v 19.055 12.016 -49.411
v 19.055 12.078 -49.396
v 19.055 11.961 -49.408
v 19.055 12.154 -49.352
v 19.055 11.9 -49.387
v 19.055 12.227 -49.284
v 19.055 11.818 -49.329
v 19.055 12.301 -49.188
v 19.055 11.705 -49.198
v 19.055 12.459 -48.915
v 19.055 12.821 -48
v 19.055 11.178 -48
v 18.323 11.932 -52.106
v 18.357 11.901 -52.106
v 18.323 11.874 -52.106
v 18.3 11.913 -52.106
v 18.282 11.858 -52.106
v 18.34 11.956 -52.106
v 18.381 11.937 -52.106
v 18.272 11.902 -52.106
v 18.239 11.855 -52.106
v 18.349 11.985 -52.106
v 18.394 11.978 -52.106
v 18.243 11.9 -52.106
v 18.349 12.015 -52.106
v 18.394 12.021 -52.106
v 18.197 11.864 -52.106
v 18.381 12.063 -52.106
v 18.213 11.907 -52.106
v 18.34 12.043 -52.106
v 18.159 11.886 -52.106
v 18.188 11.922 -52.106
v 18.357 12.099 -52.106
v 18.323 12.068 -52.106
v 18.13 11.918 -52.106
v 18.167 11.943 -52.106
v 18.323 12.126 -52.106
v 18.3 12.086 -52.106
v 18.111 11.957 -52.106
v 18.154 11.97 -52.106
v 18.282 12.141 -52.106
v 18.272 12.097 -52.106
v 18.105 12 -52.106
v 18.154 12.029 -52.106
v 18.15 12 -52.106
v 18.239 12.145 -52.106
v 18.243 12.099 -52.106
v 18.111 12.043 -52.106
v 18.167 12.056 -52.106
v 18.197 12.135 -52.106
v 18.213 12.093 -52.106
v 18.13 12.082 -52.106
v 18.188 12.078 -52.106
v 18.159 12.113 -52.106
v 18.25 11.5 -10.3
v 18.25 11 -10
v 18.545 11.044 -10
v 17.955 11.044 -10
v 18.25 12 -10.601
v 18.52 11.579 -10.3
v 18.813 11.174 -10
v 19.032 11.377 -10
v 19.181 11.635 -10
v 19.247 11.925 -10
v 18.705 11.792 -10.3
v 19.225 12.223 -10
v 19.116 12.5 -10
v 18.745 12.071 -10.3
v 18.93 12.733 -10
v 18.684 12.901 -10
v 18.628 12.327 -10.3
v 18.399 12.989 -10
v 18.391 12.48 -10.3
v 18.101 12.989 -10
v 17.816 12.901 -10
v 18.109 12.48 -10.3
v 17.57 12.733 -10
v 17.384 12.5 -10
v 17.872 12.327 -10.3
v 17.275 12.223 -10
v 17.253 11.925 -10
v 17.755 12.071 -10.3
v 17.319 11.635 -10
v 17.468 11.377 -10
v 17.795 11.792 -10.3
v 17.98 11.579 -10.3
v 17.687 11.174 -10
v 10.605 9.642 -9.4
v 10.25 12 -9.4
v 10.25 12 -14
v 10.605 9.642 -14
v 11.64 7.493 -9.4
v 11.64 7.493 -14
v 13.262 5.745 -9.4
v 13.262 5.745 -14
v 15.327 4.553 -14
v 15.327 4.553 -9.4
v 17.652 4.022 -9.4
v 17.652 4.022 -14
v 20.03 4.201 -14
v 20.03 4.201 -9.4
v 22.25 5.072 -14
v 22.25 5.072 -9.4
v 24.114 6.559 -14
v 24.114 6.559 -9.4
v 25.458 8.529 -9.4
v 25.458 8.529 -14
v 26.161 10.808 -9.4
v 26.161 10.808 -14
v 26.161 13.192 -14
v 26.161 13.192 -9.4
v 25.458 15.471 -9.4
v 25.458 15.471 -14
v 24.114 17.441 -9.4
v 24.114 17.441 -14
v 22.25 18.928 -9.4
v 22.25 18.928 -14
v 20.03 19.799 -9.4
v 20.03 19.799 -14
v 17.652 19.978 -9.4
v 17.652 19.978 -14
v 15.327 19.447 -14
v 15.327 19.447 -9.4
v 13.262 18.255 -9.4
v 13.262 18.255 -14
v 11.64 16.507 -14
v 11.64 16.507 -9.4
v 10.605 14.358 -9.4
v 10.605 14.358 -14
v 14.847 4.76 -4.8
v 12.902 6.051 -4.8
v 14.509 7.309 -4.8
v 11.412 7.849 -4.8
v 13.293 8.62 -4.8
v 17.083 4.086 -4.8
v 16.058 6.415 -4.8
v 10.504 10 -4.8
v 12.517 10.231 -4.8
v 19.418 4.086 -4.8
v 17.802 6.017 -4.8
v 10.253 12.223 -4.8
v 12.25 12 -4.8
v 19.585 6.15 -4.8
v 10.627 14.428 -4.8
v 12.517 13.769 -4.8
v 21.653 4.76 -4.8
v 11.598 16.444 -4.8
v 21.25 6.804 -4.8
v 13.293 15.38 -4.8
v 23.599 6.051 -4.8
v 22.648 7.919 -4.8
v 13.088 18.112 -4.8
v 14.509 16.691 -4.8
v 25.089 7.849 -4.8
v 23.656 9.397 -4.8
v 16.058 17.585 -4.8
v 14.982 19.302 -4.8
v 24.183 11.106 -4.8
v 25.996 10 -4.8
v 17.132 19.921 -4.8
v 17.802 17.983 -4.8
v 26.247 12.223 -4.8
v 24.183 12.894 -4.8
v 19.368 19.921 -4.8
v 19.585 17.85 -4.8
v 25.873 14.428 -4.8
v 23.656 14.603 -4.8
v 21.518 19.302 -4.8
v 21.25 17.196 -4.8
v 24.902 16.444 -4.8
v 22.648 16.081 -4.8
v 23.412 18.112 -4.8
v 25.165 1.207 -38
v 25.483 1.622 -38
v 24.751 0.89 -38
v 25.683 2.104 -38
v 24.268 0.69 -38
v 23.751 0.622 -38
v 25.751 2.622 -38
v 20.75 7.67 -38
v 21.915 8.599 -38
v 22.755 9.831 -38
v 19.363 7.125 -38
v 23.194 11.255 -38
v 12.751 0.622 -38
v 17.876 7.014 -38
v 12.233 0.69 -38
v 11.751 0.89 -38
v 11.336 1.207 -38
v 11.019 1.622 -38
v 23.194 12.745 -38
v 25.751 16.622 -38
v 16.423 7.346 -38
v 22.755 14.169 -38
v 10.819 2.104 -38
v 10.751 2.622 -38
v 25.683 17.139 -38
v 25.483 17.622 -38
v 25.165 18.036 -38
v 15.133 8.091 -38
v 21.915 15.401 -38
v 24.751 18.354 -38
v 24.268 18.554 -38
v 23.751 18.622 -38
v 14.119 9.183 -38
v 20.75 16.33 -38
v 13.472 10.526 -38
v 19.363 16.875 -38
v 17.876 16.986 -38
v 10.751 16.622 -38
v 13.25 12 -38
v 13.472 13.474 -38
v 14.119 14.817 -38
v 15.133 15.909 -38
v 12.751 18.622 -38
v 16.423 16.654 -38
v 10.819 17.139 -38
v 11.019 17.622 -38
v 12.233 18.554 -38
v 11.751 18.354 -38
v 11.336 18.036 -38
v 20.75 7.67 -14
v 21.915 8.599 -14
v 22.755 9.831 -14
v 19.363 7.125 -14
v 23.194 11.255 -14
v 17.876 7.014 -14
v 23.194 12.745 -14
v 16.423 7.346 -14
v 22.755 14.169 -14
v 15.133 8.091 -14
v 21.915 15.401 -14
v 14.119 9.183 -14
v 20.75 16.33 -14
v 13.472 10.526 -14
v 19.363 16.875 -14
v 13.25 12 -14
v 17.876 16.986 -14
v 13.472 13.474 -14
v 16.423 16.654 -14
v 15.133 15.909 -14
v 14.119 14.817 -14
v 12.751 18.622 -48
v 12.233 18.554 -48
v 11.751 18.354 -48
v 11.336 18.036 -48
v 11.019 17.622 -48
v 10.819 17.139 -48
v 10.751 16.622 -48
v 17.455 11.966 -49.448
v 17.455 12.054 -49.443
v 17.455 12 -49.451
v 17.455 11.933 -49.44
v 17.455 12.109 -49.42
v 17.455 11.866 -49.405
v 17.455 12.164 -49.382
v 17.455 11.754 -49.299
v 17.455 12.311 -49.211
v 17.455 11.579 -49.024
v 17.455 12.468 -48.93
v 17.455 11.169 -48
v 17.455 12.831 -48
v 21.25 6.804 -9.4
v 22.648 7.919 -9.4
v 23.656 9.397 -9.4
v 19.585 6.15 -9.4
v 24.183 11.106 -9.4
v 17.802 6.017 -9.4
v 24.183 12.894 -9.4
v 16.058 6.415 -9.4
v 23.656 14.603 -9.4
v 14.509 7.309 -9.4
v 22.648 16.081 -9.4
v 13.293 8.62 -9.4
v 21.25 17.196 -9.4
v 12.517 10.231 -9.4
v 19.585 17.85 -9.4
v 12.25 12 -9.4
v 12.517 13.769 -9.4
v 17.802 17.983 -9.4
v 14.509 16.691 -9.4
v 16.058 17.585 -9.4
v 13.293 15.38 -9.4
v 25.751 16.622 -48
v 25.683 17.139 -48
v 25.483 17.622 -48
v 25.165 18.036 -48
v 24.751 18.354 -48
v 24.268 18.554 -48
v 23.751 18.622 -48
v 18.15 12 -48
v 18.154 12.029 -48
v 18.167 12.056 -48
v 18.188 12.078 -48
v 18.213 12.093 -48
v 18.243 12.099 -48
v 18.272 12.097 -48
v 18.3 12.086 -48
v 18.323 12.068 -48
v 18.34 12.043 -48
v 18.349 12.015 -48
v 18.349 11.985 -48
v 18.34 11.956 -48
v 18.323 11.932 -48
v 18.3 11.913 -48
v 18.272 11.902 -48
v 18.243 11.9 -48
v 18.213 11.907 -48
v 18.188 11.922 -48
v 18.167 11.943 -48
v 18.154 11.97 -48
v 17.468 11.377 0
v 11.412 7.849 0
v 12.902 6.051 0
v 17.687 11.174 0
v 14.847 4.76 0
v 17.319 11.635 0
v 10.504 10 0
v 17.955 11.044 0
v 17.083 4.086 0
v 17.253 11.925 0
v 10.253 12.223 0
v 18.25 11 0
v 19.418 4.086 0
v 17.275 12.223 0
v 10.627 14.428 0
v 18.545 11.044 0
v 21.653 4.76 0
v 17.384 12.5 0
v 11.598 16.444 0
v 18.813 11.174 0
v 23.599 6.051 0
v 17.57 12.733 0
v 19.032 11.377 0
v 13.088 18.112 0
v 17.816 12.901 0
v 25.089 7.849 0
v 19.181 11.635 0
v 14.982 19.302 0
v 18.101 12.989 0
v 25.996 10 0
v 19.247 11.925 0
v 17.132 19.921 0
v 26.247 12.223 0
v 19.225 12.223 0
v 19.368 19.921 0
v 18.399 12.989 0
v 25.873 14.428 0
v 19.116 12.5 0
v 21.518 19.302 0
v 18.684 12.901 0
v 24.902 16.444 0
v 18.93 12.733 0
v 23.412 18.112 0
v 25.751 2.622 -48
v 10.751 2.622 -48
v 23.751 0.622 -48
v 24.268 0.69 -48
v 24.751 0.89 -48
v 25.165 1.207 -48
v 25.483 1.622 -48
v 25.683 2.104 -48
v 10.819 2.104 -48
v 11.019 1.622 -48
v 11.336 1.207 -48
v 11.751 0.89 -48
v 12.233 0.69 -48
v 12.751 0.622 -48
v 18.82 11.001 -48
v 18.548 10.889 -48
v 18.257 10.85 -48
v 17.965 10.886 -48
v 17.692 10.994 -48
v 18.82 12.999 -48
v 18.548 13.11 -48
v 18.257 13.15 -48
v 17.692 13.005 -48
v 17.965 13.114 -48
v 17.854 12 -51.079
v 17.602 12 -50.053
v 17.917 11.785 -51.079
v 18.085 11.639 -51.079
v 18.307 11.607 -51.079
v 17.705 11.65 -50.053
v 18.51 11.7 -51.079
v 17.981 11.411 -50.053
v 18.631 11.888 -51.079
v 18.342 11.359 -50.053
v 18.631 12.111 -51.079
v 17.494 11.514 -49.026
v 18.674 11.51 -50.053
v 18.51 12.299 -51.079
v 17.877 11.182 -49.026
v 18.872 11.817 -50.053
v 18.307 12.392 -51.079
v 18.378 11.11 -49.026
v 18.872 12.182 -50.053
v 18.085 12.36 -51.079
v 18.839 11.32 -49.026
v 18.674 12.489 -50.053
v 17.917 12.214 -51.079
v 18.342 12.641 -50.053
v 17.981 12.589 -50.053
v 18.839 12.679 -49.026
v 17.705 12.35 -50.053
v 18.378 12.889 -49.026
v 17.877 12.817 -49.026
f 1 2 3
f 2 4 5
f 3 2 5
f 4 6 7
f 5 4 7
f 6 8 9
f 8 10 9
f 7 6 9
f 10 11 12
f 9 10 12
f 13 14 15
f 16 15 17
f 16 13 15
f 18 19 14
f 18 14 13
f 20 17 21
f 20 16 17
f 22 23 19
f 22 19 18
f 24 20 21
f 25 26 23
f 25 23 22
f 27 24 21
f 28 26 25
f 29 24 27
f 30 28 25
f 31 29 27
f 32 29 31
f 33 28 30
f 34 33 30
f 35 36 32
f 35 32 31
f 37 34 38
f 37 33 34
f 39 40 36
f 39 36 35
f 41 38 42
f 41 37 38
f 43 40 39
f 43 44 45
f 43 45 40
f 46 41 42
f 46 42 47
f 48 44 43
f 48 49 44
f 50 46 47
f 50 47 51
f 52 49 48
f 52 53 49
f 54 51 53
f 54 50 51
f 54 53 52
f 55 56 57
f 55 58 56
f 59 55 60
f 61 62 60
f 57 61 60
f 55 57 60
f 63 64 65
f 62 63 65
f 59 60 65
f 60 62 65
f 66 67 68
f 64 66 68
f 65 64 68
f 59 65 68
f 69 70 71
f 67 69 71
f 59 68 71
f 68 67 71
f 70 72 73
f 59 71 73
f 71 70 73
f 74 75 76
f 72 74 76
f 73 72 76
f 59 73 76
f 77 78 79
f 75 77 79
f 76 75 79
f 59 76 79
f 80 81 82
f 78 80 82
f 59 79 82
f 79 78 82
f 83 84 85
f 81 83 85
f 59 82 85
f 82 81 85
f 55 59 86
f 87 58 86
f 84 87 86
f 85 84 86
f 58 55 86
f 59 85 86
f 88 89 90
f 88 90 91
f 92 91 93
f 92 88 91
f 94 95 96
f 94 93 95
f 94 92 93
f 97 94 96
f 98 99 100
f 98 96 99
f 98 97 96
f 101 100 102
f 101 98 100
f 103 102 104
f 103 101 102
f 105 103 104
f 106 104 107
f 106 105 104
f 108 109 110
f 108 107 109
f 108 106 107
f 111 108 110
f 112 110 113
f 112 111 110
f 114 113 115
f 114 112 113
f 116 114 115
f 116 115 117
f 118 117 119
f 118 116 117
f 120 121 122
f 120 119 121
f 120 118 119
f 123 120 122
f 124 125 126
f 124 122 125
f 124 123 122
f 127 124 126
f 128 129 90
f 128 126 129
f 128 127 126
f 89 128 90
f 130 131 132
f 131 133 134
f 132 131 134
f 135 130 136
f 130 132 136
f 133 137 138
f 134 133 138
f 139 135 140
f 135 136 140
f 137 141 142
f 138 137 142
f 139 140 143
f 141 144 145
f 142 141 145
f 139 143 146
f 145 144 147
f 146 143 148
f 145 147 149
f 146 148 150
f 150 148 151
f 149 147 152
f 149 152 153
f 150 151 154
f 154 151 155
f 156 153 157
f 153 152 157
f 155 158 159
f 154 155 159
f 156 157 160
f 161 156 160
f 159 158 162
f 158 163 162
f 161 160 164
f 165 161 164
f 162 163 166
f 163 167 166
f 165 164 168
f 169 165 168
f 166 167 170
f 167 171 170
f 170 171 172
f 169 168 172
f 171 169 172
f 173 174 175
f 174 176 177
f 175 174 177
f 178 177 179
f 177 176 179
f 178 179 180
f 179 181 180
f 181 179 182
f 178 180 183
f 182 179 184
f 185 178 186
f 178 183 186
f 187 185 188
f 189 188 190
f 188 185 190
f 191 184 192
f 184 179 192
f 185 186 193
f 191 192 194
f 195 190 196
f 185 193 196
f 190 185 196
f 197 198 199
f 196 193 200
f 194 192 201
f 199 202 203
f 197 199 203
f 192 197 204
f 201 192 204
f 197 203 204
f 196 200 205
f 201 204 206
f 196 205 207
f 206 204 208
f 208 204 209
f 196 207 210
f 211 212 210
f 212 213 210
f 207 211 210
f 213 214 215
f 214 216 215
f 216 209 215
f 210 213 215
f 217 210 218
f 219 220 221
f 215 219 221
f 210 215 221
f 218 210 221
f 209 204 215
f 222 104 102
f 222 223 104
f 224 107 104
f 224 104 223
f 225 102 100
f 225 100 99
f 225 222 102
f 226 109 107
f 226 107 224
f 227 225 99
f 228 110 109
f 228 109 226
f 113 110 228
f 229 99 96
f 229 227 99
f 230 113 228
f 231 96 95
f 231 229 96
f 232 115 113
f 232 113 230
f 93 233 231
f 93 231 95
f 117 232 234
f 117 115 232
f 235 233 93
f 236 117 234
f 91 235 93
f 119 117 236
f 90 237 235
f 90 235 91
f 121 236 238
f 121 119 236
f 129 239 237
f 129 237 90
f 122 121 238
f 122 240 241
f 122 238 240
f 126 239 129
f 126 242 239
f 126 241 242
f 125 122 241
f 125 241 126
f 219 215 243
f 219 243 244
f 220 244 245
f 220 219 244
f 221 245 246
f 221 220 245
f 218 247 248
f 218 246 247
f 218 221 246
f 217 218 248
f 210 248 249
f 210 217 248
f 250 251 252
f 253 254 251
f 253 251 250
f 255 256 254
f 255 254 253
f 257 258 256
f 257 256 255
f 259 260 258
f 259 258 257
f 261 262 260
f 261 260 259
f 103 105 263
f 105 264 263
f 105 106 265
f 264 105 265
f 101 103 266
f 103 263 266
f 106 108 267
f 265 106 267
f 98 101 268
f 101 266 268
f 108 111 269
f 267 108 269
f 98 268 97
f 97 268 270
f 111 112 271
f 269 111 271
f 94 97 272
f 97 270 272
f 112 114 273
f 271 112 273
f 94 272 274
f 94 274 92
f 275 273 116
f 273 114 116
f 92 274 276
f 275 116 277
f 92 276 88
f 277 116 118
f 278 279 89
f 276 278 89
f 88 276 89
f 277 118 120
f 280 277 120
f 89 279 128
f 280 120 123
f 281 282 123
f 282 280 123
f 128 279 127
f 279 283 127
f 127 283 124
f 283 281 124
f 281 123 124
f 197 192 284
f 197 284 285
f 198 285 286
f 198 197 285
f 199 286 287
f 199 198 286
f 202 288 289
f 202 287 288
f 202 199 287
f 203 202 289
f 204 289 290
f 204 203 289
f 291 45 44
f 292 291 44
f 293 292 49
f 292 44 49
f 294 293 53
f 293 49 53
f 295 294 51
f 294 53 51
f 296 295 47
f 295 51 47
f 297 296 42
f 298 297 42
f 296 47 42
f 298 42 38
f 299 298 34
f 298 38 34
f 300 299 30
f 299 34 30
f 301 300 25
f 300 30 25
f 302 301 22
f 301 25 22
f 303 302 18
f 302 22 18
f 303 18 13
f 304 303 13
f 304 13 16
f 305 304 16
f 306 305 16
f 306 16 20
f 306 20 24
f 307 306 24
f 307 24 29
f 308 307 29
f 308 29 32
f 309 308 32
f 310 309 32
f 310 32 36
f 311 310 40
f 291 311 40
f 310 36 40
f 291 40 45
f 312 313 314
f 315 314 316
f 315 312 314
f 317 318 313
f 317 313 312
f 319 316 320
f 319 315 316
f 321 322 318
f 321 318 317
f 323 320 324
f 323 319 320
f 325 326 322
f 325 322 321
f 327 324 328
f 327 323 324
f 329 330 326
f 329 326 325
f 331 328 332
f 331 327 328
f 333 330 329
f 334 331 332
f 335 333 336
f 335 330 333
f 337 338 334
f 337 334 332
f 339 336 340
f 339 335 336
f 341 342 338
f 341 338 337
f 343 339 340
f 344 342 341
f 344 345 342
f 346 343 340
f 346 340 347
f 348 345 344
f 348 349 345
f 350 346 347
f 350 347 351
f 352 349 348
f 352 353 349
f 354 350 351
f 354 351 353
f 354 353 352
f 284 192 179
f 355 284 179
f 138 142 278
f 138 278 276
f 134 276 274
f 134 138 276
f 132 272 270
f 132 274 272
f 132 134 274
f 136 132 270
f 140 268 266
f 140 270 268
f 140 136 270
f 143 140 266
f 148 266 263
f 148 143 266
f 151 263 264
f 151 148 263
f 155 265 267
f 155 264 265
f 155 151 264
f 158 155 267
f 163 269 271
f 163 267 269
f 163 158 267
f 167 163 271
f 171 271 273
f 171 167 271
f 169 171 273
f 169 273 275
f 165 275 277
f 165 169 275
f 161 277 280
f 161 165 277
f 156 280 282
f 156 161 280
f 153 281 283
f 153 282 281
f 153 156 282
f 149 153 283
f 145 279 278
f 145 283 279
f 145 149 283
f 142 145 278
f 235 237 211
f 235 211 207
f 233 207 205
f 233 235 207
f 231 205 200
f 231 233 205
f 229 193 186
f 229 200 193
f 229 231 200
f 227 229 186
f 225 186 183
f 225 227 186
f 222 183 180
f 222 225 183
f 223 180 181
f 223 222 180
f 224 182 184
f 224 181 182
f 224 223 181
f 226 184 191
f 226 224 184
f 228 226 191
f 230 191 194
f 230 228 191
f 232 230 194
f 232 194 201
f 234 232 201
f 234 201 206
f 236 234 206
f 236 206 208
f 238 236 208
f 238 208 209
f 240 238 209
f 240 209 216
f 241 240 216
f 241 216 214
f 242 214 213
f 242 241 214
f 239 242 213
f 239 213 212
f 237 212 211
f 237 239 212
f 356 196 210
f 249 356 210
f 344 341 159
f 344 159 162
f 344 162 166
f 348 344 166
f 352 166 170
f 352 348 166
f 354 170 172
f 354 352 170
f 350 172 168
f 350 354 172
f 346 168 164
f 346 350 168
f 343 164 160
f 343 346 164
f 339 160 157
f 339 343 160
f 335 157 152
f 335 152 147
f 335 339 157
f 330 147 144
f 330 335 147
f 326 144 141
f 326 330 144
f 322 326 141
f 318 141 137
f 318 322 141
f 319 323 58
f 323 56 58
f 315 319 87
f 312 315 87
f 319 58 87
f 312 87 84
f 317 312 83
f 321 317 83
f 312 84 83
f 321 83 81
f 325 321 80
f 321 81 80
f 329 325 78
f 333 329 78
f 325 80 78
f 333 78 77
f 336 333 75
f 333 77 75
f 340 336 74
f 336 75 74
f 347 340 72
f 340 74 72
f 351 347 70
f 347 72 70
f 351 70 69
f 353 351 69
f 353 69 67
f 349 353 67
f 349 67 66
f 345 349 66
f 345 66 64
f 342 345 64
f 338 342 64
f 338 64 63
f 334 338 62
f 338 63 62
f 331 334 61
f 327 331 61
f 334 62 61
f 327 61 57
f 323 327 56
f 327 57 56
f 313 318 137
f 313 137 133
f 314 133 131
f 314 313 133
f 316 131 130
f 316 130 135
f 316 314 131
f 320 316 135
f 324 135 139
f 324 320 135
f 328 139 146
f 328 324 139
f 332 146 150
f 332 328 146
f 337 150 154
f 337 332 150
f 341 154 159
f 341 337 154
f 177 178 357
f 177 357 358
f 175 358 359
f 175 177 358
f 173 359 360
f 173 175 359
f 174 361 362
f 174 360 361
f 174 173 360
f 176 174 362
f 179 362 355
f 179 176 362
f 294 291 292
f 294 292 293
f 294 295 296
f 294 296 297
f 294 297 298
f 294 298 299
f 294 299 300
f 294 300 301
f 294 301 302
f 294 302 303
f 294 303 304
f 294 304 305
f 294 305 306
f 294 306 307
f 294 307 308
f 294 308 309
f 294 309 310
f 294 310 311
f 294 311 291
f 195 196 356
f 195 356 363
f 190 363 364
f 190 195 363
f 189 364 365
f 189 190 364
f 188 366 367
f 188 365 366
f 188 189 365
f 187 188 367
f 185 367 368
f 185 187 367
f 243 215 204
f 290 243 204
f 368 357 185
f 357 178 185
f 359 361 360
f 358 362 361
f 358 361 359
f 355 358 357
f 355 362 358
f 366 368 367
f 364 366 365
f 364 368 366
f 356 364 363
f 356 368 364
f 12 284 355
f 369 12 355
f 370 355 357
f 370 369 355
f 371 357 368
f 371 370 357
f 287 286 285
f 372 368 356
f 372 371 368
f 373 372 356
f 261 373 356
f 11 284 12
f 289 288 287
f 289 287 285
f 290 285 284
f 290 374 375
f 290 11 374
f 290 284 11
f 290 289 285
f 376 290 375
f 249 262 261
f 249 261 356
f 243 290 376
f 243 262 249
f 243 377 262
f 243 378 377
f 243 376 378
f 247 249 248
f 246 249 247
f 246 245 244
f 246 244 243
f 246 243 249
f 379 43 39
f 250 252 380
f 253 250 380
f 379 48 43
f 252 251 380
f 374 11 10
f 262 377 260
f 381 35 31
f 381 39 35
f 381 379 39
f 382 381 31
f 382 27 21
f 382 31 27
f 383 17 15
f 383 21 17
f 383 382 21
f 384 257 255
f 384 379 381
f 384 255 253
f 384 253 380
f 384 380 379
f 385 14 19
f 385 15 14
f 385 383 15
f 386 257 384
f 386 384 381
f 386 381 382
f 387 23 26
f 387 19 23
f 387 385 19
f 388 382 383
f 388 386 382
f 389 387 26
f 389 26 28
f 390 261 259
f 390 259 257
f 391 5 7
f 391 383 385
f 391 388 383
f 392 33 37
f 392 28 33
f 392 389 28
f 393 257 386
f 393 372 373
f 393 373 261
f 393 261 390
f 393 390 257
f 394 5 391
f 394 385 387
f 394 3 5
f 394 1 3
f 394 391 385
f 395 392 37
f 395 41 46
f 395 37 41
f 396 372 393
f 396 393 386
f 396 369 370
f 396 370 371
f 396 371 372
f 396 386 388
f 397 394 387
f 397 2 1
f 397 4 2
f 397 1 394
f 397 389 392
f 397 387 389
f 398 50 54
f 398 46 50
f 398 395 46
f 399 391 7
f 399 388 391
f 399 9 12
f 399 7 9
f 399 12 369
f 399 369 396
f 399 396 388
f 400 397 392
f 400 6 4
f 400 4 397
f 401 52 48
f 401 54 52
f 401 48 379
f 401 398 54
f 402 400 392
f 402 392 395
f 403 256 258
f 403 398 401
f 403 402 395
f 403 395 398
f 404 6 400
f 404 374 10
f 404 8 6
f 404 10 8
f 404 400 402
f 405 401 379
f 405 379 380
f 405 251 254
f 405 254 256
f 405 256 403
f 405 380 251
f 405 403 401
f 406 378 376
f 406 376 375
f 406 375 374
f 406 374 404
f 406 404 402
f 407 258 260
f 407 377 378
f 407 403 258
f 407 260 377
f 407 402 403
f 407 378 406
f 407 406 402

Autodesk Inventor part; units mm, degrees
ref_plane "YZ Plane" through (0, 0, 0) normal (1, 0, 0) x (0, 1, 0)
ref_plane "XZ Plane" through (0, 0, 0) normal (0, 1, 0) x (-1, 0, 0)
ref_plane "XY Plane" through (0, 0, 0) normal (0, 0, 1) x (1, 0, 0)
sketch "Sketch1" plane through (0, 0, 0) normal (0, 0, 1) x (1, 0, 0)
  arc A0 (10.5041, 10) -> (25.996, 10) centre (18.25, 12) ccw projected
  circle A1 centre (18.25, 12) radius 8
  point P0 (0, 0)
extrude "Extrusion1" add sketch "Sketch1" against normal blind 4.8
sketch "Sketch2" plane through (18.25, 12, -4.8) normal (0, 0, -1) x (-1, 0, 0)
  circle A0 centre (0, 0) radius 8 projected
  circle A1 centre (0, 0) radius 6
  point P0 (18.25, -12)
  dimension "d2" = 12
extrude "Extrusion2" add sketch "Sketch2" along normal blind 4.6 contours A1
sketch "Sketch3" plane through (18.25, 12, -9.4) normal (0, 0, -1) x (-1, 0, 0)
  circle A0 centre (0, 0) radius 6 projected
  circle A1 centre (0, 0) radius 8
  point P0 (18.25, -12)
extrude "Extrusion3" add sketch "Sketch3" along normal blind 4.6 contours A0 | A1
sketch "Sketch4" plane through (18.25, 12, -14) normal (0, 0, -1) x (-1, 0, 0)
  circle A0 centre (0, 0) radius 8 projected
  circle A1 centre (0, 0) radius 5
  point P0 (18.25, -12)
  dimension "d7" = 10
extrude "Extrusion4" add sketch "Sketch4" along normal blind 24 contours A1
thread "Thread1" size "M10x1.5" class "6g" standard "ANSI Metric M Profile" full length
sketch "Sketch5" plane through (18.25, 12, -38) normal (0, 0, -1) x (-1, 0, 0)
  line L0 (-5.5007, -11.3783) -> (5.4993, -11.3783)
  line L1 (7.4993, -9.3783) -> (7.4993, 4.6217)
  line L2 (5.4993, 6.6217) -> (-5.5007, 6.6217)
  line L3 (-7.5007, 4.6217) -> (-7.5007, -9.3783)
  line L4 (-7.5007, -11.3783) -> (7.4993, 6.6217) construction
  line L5 (7.4993, -11.3783) -> (-7.5007, 6.6217) construction
  arc A0 (7.4993, 4.6217) -> (5.4993, 6.6217) centre (5.4993, 4.6217) ccw
  arc A1 (-5.5007, 6.6217) -> (-7.5007, 4.6217) centre (-5.5007, 4.6217) ccw
  arc A2 (-7.5007, -9.3783) -> (-5.5007, -11.3783) centre (-5.5007, -9.3783) ccw
  arc A3 (5.4993, -11.3783) -> (7.4993, -9.3783) centre (5.4993, -9.3783) ccw
  point P0 (18.25, -12)
  point P1 (-0.0007, -2.3783)
  dimension "d12" = 15
  dimension "d13" = 18
  dimension "d14" = 2
extrude "Extrusion5" add sketch "Sketch5" along normal blind 10
sketch "Sketch6" plane through (18.25, 12, -48) normal (0, 0, -1) x (-1, 0, 0)
  circle A0 centre (0, 0) radius 5 projected
  circle A1 centre (0, 0) radius 1.15
  point P0 (18.25, -12)
  dimension "d17" = 2.3
ref_plane "Work Plane1" through (12.7508, 11.9997, -38) normal (0, 1, 0) x (1, 0, 0)
sketch "Sketch7" plane through (12.7508, 11.9997, -38) normal (0, 1, 0) x (1, 0, 0)
  line L0 (6.6493, 10) -> (4.3493, 10) projected
  line L1 (5.4993, 10) -> (5.4993, 14.106)
  line L2 (5.3539, 14.106) -> (4.3493, 10)
  line L3 (5.4993, 14.106) -> (5.3539, 14.106)
  line L4 (5.4993, 14.106) -> (5.6446, 14.106) construction
  line L5 (5.4993, 10) -> (4.3493, 10)
  line L6 (4.3493, 10) -> (5.3539, 14.106)
  point P0 (-12.7508, -38)
  dimension "d20" = 180
revolve "Revolution1" add sketch "Sketch7" angle 360 about axis through (18.25, 11.9997, -48) along (0, 0, -1)
sketch "Sketch8" plane through (18.25, 11.9997, -52.106) normal (0, 0, -1) x (-1, 0, 0)
  circle A0 centre (0, 0) radius 0.1454 projected
  circle A1 centre (0, 0) radius 0.1
  point P0 (18.25, -11.9997)
  dimension "d22" = 0.2
extrude "Extrusion6" cut sketch "Sketch8" against normal up to surface (4.106 mm away) contours A1
sketch "Sketch9" plane through (18.25, 12, -48) normal (0, 0, -1) x (-1, 0, 0)
  line L0 (2.1554, 3.8954) -> (0.7949, 3.8954)
  line L1 (0.7949, 3.8954) -> (0.7949, -1.2159)
  line L2 (0.7949, -1.2159) -> (2.1554, -1.2159)
  line L3 (2.1554, -1.2159) -> (2.1554, 3.8954)
  line L4 (2.1554, 3.8954) -> (0.7949, -1.2159) construction
  line L5 (0.7949, 3.8954) -> (2.1554, -1.2159) construction
  line L6 (-2.1285, 4.9618) -> (-0.8047, 4.9618)
  line L7 (-0.8047, 4.9618) -> (-0.8047, -1.2159)
  line L8 (-0.8047, -1.2159) -> (-2.1285, -1.2159)
  line L9 (-2.1285, -1.2159) -> (-2.1285, 4.9618)
  line L10 (-2.1285, 4.9618) -> (-0.8047, -1.2159) construction
  line L11 (-0.8047, 4.9618) -> (-2.1285, -1.2159) construction
  point P0 (18.25, -12)
  point P1 (1.4752, 1.3398)
  point P2 (-1.4666, 1.873)
extrude "Extrusion7" cut sketch "Sketch9" along normal blind 10
sketch "Sketch10" plane through (18.25, 12, 0) normal (0, 0, 1) x (1, 0, 0)
  circle A0 centre (0, 0) radius 8 projected
  point P0 (-18.25, -12)
  point P1 (0.8047, 0.8213)
hole "Hole1" at (18.25, 12, 0) direction (0, 0, -1) diameter 2 depth 10 tip angle 118
properties part number "Hotend Mock Up"
